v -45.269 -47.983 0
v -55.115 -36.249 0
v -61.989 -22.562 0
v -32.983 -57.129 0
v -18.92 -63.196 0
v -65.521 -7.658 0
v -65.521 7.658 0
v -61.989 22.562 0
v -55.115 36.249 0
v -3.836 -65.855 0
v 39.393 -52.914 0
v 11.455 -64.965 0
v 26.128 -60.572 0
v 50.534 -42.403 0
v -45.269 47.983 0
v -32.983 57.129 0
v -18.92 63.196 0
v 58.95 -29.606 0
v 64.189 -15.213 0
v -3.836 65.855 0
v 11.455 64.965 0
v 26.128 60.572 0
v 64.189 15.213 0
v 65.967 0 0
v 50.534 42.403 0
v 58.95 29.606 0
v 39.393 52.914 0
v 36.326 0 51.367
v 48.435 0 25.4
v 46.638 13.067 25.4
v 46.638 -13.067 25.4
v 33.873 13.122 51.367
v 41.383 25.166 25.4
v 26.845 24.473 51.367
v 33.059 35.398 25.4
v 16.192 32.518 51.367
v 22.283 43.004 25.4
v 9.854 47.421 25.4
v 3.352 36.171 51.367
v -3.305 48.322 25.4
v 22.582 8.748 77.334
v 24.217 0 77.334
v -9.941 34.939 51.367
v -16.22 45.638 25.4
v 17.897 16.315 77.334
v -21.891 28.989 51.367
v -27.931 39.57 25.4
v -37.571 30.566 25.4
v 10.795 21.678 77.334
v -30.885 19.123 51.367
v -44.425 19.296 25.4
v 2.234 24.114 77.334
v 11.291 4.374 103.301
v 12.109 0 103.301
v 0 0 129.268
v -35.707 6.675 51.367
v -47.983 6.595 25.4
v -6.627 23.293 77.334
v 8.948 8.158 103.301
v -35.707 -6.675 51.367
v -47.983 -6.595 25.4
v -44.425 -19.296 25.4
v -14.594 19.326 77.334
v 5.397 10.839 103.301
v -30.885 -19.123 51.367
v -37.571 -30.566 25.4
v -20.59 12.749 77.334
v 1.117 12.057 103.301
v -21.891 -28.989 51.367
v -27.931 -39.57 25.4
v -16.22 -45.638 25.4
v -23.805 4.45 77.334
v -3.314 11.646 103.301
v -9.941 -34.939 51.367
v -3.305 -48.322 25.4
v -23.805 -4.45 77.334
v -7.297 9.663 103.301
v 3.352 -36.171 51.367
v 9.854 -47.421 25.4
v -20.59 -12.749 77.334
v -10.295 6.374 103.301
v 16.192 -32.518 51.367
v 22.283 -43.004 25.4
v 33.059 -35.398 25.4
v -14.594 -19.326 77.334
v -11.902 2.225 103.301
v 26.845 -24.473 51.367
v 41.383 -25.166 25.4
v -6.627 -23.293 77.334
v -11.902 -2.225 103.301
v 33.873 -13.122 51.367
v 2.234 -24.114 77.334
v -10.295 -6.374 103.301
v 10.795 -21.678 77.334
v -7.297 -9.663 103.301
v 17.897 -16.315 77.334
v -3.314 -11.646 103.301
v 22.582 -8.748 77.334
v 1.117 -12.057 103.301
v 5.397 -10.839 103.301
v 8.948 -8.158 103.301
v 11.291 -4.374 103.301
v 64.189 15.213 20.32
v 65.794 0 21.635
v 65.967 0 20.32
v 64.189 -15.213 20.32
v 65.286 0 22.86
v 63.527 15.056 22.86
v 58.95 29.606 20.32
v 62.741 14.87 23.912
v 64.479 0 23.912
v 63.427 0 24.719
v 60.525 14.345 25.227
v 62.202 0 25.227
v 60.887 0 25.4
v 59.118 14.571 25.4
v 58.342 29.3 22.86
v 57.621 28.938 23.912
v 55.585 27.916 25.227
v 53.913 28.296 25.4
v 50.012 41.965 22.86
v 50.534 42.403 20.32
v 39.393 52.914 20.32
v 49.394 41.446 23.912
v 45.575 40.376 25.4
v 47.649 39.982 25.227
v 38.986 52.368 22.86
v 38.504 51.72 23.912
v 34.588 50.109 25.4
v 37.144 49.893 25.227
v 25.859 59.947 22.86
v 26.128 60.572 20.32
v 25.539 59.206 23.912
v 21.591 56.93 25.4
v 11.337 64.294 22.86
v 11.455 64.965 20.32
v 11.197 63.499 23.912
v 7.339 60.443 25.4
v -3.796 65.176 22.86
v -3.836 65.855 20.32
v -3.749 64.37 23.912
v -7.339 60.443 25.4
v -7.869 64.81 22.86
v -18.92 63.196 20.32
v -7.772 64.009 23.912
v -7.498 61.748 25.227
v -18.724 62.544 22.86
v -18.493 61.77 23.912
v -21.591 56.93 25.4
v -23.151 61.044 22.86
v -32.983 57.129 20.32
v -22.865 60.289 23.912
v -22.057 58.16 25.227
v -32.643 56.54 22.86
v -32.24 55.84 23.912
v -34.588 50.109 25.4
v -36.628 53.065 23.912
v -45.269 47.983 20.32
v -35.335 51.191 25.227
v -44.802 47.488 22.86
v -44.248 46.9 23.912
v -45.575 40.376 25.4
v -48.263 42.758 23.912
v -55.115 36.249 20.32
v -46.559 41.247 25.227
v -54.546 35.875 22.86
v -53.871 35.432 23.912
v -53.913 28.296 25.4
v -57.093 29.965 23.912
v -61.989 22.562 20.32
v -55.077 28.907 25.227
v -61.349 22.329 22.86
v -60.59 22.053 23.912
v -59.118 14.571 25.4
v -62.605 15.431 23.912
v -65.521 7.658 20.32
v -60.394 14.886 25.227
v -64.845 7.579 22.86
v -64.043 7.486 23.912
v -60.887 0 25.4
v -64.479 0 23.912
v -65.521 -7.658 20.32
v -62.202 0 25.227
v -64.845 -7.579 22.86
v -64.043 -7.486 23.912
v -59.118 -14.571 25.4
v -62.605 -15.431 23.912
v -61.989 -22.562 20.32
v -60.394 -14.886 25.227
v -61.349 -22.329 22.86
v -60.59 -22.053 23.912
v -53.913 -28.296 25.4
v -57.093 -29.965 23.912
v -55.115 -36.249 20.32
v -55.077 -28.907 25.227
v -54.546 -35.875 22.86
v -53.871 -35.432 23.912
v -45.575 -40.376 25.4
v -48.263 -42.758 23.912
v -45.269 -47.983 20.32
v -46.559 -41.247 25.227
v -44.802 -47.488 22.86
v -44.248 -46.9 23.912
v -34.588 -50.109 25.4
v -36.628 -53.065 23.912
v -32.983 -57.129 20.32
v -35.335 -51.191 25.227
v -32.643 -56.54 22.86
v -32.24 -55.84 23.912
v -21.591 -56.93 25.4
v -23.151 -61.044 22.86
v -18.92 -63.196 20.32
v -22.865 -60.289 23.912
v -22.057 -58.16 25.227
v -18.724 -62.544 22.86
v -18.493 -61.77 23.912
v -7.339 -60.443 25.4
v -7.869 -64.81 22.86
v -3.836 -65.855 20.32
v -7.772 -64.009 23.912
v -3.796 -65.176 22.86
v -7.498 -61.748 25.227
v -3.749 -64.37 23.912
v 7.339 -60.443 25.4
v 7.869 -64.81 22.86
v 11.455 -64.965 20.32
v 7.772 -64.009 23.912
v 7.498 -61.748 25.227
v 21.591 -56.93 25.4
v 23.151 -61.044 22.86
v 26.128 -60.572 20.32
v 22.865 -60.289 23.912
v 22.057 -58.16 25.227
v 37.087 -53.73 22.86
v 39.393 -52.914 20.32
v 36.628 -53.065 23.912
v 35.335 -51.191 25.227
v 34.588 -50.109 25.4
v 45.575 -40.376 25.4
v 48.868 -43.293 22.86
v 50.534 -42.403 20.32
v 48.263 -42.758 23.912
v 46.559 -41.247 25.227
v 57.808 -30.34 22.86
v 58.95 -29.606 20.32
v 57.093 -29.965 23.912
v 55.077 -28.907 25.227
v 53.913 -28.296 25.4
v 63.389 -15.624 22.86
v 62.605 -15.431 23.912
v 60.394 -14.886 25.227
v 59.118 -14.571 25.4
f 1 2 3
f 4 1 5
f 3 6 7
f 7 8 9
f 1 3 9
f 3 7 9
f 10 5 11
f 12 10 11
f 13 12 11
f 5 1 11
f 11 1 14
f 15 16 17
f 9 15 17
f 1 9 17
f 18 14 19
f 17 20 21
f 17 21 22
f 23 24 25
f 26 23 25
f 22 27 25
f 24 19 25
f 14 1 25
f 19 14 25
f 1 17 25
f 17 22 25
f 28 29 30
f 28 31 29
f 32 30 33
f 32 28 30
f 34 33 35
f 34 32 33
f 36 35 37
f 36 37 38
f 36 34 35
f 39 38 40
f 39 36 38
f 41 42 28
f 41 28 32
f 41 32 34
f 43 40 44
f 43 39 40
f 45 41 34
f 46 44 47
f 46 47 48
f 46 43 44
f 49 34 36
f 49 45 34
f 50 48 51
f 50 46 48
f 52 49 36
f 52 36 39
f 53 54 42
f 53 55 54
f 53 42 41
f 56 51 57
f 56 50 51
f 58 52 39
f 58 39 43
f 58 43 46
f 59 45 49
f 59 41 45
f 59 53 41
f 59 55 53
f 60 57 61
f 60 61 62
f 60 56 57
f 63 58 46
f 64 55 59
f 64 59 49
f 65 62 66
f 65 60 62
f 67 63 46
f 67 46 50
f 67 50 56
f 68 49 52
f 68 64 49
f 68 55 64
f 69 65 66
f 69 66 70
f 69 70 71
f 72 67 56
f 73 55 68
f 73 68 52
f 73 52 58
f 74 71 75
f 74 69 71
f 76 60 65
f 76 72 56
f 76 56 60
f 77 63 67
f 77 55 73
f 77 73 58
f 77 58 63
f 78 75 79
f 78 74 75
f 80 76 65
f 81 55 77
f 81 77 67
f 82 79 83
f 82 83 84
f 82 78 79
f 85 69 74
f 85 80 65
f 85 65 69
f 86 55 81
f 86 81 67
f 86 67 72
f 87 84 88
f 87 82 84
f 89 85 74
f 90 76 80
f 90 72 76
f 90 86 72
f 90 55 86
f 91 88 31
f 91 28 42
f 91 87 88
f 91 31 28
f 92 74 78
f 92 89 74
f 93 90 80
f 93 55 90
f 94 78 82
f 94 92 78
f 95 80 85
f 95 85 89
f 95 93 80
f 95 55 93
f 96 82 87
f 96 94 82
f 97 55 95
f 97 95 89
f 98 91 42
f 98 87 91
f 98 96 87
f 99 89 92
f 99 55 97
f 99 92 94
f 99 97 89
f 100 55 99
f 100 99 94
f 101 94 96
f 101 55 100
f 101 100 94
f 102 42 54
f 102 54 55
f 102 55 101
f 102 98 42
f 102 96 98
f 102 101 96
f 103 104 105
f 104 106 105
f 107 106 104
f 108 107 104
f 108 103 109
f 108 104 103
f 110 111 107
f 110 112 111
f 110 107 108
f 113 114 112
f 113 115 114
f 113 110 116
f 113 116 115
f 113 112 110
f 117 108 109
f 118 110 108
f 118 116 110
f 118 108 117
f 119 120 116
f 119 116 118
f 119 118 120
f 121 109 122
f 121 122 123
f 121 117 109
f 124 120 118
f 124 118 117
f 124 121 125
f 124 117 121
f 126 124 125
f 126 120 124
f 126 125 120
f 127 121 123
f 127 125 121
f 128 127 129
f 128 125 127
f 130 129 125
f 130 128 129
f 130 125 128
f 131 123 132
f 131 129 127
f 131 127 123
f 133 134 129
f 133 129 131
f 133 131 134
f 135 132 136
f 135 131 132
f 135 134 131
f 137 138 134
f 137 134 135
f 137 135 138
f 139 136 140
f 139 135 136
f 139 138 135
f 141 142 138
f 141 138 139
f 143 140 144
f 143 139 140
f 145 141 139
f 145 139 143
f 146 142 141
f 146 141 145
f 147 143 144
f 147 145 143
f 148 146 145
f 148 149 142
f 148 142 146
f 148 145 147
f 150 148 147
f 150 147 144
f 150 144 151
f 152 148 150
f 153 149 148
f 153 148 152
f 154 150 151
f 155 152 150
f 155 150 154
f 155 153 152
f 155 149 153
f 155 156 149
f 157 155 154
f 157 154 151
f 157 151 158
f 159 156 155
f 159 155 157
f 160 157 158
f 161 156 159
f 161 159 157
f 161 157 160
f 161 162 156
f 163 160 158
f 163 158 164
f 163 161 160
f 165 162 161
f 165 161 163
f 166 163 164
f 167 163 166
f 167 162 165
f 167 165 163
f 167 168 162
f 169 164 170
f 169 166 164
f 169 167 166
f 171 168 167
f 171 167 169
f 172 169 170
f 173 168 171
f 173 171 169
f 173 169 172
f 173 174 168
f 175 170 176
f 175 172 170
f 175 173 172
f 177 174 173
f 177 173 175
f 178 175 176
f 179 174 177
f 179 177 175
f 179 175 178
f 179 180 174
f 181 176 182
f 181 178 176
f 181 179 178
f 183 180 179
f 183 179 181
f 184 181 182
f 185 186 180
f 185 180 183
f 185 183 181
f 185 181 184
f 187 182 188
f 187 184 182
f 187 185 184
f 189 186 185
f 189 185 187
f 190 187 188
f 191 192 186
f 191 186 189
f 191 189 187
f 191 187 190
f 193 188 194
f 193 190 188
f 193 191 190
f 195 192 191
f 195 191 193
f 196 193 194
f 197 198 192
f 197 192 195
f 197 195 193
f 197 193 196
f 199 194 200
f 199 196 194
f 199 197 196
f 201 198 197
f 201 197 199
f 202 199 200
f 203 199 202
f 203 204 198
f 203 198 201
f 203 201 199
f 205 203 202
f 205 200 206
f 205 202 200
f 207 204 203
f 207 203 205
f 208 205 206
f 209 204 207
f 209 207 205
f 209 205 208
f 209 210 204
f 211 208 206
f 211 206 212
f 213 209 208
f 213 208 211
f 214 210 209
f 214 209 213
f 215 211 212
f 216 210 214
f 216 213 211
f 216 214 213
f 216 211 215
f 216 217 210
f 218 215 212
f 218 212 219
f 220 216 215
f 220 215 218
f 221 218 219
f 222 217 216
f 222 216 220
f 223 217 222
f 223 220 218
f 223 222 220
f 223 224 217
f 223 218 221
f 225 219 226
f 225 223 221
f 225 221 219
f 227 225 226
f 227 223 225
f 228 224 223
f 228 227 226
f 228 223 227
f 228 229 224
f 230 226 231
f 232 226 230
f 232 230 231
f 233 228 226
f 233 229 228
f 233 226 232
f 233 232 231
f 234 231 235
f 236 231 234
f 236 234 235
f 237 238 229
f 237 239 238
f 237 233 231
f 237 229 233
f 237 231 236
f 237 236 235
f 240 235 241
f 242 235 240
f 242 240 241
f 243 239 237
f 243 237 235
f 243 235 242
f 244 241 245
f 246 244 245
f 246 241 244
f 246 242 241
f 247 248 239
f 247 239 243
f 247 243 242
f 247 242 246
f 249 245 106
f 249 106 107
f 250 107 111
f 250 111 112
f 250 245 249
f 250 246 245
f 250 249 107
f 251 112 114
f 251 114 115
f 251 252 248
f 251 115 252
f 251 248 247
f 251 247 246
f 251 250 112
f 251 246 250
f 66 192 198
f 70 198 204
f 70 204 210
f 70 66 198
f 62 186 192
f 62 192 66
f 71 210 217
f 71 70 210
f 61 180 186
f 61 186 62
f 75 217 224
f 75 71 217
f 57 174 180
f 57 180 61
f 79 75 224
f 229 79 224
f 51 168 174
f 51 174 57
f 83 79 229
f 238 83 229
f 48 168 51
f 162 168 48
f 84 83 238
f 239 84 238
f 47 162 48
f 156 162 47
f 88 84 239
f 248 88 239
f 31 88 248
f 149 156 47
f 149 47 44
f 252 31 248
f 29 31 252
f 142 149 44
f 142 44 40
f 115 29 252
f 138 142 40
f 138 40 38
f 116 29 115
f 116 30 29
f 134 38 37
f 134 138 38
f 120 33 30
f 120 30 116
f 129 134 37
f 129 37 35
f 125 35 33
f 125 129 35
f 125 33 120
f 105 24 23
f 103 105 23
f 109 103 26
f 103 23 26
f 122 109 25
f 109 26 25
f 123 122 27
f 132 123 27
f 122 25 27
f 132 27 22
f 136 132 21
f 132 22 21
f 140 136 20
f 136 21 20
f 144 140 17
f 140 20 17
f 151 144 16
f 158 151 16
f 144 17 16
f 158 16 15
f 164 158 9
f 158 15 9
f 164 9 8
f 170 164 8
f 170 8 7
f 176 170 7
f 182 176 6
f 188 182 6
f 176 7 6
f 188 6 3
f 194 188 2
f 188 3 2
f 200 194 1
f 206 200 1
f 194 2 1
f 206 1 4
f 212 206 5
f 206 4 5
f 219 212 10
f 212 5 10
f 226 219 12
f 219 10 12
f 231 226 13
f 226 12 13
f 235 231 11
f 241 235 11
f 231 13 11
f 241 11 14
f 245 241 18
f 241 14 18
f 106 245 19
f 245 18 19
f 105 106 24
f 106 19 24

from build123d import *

# Parameters (mm, degrees)
F0_R      = 65.9669270207
F1_DEPTH  = 25.4
F2_R      = 57.1573615092
F3_DEPTH  = 17.78
F4_R      = 65.9669270207
F4_R_2    = 55.5551469753
F6_DEPTH  = 65.8464431763
F7_R      = 5.08
F10_R     = 60.2787250823
F11_DEPTH = 203.2
F11_TAPER = 25


with BuildPart() as f1:
    # F0 (on Top) → F1 (new body)
    with BuildSketch(Plane.XY):
        Circle(F0_R)
    extrude(amount=F1_DEPTH)

    # F2 (on Top) → F3 (cut)
    with BuildSketch(Plane.XY):
        Circle(F2_R)
    extrude(amount=-F3_DEPTH, mode=Mode.SUBTRACT)

    # F4 (on face) → F6 (cut)
    with BuildSketch(Plane.XY.offset(25.4)):
        Circle(F4_R)
        Circle(F4_R_2, mode=Mode.SUBTRACT)
        Circle(F4_R_2)
    extrude(amount=F6_DEPTH, mode=Mode.SUBTRACT)

    # F7
    f7_edges = [f1.edges().sort_by_distance(p)[0] for p in [
        (-65.966927, 0, 25.4),
    ]]
    fillet(f7_edges, radius=F7_R)

    # F10 (on face) → F11 (join)
    with BuildSketch(Plane.XY):
        Circle(F10_R)
    extrude(amount=F11_DEPTH, taper=F11_TAPER)


solid = f1.part
